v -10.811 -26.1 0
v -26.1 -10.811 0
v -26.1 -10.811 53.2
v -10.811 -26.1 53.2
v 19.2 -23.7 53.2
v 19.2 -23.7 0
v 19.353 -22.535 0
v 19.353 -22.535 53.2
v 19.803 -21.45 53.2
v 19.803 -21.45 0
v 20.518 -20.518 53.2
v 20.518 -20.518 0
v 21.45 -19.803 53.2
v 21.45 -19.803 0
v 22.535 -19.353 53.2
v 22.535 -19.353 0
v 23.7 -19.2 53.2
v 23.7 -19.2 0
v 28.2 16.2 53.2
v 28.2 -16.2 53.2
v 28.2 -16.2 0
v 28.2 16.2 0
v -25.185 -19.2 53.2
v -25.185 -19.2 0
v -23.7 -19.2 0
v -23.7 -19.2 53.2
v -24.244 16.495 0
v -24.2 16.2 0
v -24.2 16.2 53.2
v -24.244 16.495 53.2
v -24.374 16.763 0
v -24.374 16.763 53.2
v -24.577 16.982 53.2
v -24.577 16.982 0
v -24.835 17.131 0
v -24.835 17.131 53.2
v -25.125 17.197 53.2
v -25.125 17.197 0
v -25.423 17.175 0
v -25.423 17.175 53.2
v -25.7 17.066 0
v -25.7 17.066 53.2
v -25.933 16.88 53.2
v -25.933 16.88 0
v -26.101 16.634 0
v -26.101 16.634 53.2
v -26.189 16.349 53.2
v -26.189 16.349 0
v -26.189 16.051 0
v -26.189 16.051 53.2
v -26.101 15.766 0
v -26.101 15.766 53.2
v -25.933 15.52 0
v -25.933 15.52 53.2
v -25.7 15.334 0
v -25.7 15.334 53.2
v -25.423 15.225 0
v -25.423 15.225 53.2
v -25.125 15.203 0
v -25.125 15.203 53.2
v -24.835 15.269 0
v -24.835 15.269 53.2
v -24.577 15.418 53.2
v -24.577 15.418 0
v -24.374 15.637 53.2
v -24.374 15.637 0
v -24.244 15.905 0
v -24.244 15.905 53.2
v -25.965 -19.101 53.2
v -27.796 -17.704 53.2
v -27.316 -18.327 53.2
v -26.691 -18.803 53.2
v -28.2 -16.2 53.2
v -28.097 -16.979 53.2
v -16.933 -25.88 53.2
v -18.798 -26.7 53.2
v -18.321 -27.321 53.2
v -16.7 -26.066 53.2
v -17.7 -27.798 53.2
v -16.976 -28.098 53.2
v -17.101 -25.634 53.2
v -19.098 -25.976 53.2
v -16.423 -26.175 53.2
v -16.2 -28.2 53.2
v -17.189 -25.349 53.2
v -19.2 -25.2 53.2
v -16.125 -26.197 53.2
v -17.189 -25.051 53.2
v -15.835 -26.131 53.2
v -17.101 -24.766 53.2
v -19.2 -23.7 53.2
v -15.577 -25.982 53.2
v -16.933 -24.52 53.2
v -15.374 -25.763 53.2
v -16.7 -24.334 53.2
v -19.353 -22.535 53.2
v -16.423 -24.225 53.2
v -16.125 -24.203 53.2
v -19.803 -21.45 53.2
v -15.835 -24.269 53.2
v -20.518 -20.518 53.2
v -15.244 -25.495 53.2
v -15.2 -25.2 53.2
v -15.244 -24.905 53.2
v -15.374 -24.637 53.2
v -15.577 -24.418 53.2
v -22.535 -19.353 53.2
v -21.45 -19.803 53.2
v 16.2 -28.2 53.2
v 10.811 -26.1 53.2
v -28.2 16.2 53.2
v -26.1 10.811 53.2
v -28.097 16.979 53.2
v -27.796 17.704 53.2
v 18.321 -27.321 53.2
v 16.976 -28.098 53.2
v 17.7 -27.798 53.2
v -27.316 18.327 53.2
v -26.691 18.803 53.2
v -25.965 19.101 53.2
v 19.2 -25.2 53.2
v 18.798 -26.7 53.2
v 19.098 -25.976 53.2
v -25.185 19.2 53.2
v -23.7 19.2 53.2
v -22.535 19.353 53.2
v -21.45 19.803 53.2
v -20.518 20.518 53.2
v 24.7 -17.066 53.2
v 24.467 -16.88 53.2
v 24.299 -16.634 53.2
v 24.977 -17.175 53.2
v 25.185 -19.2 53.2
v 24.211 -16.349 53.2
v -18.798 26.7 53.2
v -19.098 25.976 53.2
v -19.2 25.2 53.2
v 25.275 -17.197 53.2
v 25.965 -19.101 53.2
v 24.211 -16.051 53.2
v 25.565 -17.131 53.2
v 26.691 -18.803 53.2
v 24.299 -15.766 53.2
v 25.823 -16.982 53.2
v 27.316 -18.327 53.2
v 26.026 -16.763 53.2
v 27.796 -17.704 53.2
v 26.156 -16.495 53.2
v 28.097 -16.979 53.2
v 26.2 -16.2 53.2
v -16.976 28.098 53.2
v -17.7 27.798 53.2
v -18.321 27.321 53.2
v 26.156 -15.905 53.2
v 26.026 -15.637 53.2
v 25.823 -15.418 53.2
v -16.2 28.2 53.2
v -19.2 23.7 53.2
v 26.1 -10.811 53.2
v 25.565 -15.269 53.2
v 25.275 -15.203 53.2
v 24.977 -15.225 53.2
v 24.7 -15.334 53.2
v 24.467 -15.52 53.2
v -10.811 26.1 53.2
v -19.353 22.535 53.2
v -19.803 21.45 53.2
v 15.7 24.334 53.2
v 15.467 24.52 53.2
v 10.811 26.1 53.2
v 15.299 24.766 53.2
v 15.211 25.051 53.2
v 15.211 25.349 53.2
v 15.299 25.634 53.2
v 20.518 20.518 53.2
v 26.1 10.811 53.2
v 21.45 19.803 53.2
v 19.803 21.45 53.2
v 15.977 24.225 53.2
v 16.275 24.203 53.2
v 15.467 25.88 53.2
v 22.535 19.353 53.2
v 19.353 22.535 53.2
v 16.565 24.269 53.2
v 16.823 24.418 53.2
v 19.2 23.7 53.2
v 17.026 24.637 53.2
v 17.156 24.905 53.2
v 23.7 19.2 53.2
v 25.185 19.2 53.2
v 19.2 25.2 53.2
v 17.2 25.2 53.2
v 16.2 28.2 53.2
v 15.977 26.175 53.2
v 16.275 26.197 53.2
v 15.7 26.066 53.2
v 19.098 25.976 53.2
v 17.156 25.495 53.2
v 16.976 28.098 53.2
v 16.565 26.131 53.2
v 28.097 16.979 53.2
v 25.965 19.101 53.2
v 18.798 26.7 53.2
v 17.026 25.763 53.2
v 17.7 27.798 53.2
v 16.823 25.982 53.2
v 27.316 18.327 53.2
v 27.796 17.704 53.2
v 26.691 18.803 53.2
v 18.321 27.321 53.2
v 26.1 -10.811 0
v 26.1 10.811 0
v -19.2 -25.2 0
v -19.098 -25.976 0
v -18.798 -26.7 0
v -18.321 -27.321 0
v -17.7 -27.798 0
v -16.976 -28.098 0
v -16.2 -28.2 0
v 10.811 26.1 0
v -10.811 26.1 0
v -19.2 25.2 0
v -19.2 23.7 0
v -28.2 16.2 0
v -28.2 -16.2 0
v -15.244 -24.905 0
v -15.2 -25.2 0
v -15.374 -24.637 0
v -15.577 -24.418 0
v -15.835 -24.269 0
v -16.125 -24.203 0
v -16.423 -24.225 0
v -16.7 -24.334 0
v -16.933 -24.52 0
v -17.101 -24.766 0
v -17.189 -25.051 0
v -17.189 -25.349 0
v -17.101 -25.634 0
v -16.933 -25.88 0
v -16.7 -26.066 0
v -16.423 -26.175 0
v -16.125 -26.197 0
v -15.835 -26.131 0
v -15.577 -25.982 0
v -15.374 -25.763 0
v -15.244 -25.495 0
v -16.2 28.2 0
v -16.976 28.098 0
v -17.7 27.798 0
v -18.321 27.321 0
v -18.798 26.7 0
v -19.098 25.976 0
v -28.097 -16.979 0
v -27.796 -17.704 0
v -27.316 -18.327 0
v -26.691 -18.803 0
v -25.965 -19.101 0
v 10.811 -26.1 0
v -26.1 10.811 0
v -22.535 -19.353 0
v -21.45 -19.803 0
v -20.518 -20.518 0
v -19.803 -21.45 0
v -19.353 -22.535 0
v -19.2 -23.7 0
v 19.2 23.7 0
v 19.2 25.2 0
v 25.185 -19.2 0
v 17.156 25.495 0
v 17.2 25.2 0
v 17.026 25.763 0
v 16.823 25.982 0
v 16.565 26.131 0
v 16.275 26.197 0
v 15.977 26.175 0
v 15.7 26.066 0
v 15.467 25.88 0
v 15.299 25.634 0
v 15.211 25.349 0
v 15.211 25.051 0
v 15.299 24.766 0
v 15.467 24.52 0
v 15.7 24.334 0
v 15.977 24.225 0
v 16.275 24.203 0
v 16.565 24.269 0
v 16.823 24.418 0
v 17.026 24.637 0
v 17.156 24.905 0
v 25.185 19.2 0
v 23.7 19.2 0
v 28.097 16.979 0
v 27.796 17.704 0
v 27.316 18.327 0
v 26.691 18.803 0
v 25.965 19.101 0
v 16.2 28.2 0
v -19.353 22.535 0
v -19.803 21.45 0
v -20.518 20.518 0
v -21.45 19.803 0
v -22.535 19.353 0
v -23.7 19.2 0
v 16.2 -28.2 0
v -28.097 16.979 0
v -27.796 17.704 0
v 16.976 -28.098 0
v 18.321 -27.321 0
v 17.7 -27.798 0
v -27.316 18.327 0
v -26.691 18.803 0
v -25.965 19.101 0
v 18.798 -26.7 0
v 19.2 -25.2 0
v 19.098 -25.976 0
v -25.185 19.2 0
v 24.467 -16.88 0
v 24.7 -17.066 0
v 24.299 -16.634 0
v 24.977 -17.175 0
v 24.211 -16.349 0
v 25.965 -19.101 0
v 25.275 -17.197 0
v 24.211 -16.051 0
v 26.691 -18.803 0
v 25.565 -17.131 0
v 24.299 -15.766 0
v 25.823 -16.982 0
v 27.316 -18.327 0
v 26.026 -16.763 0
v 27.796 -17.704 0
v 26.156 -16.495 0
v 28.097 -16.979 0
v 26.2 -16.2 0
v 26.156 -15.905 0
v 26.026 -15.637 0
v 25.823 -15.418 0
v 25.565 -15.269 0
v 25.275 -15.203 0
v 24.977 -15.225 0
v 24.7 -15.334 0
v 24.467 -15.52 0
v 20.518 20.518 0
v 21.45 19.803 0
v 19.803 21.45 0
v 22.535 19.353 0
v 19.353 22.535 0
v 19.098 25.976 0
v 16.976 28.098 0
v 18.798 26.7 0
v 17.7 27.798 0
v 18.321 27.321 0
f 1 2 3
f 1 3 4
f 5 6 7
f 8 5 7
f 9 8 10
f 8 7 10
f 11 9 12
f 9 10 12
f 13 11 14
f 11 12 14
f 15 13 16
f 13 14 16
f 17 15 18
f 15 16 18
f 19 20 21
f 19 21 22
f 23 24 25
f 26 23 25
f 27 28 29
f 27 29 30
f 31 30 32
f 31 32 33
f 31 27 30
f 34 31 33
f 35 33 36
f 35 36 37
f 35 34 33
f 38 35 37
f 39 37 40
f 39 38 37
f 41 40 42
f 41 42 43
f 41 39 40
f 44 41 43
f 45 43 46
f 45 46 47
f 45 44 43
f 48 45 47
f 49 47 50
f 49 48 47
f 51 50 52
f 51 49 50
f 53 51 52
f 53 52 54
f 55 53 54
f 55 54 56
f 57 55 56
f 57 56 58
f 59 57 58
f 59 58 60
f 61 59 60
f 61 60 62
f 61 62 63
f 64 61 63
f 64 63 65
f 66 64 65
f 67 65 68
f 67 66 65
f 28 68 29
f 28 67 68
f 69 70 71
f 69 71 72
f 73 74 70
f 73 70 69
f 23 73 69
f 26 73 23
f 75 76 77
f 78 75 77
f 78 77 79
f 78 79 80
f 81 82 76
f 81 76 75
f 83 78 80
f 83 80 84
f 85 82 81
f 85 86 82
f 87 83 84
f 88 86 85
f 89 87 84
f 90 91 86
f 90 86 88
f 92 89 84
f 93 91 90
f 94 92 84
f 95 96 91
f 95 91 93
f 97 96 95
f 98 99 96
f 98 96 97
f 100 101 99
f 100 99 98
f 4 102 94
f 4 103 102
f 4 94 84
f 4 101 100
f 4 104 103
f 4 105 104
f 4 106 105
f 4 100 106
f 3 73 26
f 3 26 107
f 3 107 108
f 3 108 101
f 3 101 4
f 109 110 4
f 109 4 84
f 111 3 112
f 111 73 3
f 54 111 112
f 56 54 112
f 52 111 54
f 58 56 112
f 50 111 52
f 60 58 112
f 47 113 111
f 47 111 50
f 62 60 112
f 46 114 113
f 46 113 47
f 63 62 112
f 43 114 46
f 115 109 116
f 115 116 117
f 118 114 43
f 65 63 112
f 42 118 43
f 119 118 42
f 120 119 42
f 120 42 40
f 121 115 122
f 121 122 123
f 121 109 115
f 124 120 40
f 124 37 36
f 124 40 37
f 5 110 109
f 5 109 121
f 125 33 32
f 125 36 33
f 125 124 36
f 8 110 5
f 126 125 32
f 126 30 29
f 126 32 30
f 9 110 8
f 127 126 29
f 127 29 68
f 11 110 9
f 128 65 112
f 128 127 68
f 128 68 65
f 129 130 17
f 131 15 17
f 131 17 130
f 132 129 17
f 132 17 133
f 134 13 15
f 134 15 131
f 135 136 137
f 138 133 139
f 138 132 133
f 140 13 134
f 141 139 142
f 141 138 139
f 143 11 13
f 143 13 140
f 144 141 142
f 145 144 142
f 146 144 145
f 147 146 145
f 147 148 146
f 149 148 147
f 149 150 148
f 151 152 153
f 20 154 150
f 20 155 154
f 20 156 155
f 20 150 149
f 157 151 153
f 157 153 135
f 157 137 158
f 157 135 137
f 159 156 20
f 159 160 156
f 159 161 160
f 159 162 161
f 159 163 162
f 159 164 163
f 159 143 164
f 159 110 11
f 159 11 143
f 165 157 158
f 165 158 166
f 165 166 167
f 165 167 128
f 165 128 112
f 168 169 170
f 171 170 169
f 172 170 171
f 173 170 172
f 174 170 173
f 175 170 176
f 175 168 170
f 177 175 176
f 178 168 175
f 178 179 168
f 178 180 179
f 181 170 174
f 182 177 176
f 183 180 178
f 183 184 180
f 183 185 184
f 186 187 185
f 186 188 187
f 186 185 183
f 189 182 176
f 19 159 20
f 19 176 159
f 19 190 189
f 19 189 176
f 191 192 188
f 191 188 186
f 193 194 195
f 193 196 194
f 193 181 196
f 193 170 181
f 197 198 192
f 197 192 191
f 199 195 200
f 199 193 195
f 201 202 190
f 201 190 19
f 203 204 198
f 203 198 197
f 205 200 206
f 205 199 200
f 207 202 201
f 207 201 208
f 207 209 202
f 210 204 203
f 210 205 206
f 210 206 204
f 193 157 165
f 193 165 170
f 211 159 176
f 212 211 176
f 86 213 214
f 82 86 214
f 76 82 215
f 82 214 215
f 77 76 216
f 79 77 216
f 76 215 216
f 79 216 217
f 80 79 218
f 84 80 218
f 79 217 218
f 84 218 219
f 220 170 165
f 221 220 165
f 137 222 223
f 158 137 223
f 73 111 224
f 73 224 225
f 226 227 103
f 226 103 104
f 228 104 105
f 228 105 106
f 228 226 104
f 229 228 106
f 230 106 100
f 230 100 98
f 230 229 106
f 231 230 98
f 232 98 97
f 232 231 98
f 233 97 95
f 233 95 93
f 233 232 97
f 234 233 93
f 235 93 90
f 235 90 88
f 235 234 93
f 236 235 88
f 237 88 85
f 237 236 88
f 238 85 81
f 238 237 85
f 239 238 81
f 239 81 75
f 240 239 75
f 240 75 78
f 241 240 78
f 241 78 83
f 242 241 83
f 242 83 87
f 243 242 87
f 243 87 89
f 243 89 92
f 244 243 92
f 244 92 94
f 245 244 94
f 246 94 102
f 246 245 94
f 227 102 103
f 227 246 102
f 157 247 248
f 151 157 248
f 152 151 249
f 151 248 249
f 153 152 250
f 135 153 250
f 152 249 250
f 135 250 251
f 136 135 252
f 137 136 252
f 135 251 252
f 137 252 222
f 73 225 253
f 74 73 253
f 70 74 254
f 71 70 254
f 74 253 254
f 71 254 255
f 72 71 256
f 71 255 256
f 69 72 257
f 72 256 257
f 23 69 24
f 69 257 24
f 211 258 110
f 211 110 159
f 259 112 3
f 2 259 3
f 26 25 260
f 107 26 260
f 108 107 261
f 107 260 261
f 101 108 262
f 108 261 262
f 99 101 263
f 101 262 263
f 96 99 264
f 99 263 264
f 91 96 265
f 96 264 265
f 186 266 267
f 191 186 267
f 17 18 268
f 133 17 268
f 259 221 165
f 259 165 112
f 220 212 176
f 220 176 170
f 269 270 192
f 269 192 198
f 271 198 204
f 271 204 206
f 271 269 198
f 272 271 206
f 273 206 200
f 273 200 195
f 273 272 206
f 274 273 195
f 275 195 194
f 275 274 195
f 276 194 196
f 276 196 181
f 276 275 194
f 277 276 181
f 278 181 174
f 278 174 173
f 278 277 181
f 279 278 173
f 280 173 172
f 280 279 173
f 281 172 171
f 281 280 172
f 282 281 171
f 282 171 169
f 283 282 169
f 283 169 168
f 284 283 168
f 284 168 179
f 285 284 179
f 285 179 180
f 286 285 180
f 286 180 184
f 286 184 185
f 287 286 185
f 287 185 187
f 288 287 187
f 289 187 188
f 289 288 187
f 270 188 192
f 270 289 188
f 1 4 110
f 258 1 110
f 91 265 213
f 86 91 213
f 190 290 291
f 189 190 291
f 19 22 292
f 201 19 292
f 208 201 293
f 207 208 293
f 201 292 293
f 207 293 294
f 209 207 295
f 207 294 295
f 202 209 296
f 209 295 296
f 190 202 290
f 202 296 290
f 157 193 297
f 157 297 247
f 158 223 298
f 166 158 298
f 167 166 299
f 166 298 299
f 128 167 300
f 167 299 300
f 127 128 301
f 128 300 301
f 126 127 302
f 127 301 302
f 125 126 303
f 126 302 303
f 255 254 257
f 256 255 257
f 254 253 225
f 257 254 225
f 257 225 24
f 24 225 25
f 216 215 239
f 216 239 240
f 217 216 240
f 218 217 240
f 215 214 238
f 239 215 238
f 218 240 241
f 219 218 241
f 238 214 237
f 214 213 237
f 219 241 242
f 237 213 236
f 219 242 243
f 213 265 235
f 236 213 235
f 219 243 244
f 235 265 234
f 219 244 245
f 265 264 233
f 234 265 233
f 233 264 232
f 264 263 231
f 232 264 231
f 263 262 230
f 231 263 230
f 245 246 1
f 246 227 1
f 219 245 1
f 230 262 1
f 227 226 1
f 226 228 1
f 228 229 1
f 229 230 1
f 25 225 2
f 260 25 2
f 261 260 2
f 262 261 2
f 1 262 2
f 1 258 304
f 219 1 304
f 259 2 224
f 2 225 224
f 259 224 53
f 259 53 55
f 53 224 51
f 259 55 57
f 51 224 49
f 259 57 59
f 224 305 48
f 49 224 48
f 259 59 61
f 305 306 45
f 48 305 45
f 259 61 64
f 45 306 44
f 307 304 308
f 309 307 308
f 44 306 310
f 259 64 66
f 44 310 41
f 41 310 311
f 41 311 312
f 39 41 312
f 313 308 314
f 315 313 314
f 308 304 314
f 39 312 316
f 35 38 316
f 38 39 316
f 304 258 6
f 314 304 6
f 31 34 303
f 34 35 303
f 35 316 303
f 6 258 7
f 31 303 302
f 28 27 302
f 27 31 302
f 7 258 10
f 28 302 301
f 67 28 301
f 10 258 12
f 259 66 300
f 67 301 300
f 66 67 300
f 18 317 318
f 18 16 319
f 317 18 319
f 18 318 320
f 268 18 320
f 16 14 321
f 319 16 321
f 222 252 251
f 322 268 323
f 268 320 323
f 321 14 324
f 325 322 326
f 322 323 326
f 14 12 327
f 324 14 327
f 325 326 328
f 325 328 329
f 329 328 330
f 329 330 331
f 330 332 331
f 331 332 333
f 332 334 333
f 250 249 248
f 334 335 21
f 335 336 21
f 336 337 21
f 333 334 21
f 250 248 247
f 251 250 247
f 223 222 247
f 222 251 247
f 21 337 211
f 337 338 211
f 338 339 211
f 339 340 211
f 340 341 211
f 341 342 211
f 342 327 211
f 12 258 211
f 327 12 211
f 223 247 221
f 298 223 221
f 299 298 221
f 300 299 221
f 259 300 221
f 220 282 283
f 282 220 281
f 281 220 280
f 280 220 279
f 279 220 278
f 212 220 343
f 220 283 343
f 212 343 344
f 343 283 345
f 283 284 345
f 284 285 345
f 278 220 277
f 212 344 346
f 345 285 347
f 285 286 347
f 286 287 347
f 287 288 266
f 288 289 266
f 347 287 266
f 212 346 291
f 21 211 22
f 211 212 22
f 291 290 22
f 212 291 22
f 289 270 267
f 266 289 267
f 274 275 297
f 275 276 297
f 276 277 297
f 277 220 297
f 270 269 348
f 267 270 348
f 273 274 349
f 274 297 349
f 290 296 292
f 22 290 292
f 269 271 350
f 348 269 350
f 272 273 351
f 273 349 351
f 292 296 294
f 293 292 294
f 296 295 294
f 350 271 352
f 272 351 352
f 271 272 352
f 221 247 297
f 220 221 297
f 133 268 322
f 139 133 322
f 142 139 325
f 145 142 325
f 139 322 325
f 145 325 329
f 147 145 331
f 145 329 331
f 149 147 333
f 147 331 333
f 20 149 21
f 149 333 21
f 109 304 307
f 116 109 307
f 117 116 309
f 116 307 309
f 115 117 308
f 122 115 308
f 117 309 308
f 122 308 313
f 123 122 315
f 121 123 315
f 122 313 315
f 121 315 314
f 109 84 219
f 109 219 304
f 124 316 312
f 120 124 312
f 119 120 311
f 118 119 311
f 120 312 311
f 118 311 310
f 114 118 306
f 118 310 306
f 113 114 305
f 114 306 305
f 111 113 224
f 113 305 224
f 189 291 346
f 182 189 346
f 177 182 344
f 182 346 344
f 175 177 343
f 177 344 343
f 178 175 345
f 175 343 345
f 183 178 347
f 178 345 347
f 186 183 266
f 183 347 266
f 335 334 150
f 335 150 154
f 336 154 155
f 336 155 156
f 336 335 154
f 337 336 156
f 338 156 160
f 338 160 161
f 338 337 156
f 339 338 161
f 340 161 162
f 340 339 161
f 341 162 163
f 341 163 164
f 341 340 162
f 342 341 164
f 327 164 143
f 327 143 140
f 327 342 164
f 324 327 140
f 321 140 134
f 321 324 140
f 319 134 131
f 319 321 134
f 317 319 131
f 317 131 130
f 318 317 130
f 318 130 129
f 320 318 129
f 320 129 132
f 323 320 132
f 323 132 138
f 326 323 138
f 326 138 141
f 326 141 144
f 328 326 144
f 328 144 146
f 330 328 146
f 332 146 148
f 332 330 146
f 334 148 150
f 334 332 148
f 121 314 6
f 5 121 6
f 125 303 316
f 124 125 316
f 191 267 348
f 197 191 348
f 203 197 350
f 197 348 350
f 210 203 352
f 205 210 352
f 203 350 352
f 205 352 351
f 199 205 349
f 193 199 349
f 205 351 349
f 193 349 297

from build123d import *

# Parameters (mm, degrees)
SKETCH1_R           = 1
BOSS_EXTRUDE1_DEPTH = 53.2


with BuildPart() as part:
    # Sketch1 → Boss-Extrude1 (new body)
    with BuildSketch(Plane.XY):
        with BuildLine():
            Line((-23.7, 19.2), (-25.185156579, 19.199963279))
            ThreePointArc((-25.185156579, 19.199963279), (-27.316065894, 18.32656181), (-28.2, 16.2))
            Line((-28.2, 16.2), (-28.2, -16.2))
            ThreePointArc((-28.2, -16.2), (-27.316065894, -18.32656181), (-25.185156579, -19.199963279))
            Line((-25.185156579, -19.199963279), (-23.7, -19.2))
            ThreePointArc((-23.7, -19.2), (-20.518019485, -20.518019485), (-19.2, -23.7))
            Line((-19.2, -23.7), (-19.2, -25.2))
            ThreePointArc((-19.2, -25.2), (-18.321320344, -27.321320344), (-16.2, -28.2))
            Line((-16.2, -28.2), (16.2, -28.2))
            ThreePointArc((16.2, -28.2), (18.321320344, -27.321320344), (19.2, -25.2))
            Line((19.2, -25.2), (19.2, -23.7))
            ThreePointArc((19.2, -23.7), (20.518019485, -20.518019485), (23.7, -19.2))
            Line((23.7, -19.2), (25.185156579, -19.199963279))
            ThreePointArc((25.185156579, -19.199963279), (27.316065894, -18.32656181), (28.2, -16.2))
            Line((28.2, -16.2), (28.2, 16.2))
            ThreePointArc((28.2, 16.2), (27.316065894, 18.32656181), (25.185156579, 19.199963279))
            Line((25.185156579, 19.199963279), (23.7, 19.2))
            ThreePointArc((23.7, 19.2), (20.518019485, 20.518019485), (19.2, 23.7))
            Line((19.2, 23.7), (19.2, 25.2))
            ThreePointArc((19.2, 25.2), (18.321320344, 27.321320344), (16.2, 28.2))
            Line((16.2, 28.2), (-16.2, 28.2))
            ThreePointArc((-16.2, 28.2), (-18.321320344, 27.321320344), (-19.2, 25.2))
            Line((-19.2, 25.2), (-19.2, 23.7))
            ThreePointArc((-19.2, 23.7), (-20.518019485, 20.518019485), (-23.7, 19.2))
        make_face()
        with Locations((-25.2, 16.2)):
            Circle(SKETCH1_R, mode=Mode.SUBTRACT)
        with Locations((16.2, 25.2)):
            Circle(SKETCH1_R, mode=Mode.SUBTRACT)
        with Locations((25.2, -16.2)):
            Circle(SKETCH1_R, mode=Mode.SUBTRACT)
        with Locations((-16.2, -25.2)):
            Circle(SKETCH1_R, mode=Mode.SUBTRACT)
        Polygon((10.810973978, -26.1), (26.1, -10.810973978), (26.1, 10.810973978), (10.810973978, 26.1), (-10.810973978, 26.1), (-26.1, 10.810973978), (-26.1, -10.810973978), (-10.810973978, -26.1), align=None, mode=Mode.SUBTRACT)
    extrude(amount=BOSS_EXTRUDE1_DEPTH)


solid = part.part
